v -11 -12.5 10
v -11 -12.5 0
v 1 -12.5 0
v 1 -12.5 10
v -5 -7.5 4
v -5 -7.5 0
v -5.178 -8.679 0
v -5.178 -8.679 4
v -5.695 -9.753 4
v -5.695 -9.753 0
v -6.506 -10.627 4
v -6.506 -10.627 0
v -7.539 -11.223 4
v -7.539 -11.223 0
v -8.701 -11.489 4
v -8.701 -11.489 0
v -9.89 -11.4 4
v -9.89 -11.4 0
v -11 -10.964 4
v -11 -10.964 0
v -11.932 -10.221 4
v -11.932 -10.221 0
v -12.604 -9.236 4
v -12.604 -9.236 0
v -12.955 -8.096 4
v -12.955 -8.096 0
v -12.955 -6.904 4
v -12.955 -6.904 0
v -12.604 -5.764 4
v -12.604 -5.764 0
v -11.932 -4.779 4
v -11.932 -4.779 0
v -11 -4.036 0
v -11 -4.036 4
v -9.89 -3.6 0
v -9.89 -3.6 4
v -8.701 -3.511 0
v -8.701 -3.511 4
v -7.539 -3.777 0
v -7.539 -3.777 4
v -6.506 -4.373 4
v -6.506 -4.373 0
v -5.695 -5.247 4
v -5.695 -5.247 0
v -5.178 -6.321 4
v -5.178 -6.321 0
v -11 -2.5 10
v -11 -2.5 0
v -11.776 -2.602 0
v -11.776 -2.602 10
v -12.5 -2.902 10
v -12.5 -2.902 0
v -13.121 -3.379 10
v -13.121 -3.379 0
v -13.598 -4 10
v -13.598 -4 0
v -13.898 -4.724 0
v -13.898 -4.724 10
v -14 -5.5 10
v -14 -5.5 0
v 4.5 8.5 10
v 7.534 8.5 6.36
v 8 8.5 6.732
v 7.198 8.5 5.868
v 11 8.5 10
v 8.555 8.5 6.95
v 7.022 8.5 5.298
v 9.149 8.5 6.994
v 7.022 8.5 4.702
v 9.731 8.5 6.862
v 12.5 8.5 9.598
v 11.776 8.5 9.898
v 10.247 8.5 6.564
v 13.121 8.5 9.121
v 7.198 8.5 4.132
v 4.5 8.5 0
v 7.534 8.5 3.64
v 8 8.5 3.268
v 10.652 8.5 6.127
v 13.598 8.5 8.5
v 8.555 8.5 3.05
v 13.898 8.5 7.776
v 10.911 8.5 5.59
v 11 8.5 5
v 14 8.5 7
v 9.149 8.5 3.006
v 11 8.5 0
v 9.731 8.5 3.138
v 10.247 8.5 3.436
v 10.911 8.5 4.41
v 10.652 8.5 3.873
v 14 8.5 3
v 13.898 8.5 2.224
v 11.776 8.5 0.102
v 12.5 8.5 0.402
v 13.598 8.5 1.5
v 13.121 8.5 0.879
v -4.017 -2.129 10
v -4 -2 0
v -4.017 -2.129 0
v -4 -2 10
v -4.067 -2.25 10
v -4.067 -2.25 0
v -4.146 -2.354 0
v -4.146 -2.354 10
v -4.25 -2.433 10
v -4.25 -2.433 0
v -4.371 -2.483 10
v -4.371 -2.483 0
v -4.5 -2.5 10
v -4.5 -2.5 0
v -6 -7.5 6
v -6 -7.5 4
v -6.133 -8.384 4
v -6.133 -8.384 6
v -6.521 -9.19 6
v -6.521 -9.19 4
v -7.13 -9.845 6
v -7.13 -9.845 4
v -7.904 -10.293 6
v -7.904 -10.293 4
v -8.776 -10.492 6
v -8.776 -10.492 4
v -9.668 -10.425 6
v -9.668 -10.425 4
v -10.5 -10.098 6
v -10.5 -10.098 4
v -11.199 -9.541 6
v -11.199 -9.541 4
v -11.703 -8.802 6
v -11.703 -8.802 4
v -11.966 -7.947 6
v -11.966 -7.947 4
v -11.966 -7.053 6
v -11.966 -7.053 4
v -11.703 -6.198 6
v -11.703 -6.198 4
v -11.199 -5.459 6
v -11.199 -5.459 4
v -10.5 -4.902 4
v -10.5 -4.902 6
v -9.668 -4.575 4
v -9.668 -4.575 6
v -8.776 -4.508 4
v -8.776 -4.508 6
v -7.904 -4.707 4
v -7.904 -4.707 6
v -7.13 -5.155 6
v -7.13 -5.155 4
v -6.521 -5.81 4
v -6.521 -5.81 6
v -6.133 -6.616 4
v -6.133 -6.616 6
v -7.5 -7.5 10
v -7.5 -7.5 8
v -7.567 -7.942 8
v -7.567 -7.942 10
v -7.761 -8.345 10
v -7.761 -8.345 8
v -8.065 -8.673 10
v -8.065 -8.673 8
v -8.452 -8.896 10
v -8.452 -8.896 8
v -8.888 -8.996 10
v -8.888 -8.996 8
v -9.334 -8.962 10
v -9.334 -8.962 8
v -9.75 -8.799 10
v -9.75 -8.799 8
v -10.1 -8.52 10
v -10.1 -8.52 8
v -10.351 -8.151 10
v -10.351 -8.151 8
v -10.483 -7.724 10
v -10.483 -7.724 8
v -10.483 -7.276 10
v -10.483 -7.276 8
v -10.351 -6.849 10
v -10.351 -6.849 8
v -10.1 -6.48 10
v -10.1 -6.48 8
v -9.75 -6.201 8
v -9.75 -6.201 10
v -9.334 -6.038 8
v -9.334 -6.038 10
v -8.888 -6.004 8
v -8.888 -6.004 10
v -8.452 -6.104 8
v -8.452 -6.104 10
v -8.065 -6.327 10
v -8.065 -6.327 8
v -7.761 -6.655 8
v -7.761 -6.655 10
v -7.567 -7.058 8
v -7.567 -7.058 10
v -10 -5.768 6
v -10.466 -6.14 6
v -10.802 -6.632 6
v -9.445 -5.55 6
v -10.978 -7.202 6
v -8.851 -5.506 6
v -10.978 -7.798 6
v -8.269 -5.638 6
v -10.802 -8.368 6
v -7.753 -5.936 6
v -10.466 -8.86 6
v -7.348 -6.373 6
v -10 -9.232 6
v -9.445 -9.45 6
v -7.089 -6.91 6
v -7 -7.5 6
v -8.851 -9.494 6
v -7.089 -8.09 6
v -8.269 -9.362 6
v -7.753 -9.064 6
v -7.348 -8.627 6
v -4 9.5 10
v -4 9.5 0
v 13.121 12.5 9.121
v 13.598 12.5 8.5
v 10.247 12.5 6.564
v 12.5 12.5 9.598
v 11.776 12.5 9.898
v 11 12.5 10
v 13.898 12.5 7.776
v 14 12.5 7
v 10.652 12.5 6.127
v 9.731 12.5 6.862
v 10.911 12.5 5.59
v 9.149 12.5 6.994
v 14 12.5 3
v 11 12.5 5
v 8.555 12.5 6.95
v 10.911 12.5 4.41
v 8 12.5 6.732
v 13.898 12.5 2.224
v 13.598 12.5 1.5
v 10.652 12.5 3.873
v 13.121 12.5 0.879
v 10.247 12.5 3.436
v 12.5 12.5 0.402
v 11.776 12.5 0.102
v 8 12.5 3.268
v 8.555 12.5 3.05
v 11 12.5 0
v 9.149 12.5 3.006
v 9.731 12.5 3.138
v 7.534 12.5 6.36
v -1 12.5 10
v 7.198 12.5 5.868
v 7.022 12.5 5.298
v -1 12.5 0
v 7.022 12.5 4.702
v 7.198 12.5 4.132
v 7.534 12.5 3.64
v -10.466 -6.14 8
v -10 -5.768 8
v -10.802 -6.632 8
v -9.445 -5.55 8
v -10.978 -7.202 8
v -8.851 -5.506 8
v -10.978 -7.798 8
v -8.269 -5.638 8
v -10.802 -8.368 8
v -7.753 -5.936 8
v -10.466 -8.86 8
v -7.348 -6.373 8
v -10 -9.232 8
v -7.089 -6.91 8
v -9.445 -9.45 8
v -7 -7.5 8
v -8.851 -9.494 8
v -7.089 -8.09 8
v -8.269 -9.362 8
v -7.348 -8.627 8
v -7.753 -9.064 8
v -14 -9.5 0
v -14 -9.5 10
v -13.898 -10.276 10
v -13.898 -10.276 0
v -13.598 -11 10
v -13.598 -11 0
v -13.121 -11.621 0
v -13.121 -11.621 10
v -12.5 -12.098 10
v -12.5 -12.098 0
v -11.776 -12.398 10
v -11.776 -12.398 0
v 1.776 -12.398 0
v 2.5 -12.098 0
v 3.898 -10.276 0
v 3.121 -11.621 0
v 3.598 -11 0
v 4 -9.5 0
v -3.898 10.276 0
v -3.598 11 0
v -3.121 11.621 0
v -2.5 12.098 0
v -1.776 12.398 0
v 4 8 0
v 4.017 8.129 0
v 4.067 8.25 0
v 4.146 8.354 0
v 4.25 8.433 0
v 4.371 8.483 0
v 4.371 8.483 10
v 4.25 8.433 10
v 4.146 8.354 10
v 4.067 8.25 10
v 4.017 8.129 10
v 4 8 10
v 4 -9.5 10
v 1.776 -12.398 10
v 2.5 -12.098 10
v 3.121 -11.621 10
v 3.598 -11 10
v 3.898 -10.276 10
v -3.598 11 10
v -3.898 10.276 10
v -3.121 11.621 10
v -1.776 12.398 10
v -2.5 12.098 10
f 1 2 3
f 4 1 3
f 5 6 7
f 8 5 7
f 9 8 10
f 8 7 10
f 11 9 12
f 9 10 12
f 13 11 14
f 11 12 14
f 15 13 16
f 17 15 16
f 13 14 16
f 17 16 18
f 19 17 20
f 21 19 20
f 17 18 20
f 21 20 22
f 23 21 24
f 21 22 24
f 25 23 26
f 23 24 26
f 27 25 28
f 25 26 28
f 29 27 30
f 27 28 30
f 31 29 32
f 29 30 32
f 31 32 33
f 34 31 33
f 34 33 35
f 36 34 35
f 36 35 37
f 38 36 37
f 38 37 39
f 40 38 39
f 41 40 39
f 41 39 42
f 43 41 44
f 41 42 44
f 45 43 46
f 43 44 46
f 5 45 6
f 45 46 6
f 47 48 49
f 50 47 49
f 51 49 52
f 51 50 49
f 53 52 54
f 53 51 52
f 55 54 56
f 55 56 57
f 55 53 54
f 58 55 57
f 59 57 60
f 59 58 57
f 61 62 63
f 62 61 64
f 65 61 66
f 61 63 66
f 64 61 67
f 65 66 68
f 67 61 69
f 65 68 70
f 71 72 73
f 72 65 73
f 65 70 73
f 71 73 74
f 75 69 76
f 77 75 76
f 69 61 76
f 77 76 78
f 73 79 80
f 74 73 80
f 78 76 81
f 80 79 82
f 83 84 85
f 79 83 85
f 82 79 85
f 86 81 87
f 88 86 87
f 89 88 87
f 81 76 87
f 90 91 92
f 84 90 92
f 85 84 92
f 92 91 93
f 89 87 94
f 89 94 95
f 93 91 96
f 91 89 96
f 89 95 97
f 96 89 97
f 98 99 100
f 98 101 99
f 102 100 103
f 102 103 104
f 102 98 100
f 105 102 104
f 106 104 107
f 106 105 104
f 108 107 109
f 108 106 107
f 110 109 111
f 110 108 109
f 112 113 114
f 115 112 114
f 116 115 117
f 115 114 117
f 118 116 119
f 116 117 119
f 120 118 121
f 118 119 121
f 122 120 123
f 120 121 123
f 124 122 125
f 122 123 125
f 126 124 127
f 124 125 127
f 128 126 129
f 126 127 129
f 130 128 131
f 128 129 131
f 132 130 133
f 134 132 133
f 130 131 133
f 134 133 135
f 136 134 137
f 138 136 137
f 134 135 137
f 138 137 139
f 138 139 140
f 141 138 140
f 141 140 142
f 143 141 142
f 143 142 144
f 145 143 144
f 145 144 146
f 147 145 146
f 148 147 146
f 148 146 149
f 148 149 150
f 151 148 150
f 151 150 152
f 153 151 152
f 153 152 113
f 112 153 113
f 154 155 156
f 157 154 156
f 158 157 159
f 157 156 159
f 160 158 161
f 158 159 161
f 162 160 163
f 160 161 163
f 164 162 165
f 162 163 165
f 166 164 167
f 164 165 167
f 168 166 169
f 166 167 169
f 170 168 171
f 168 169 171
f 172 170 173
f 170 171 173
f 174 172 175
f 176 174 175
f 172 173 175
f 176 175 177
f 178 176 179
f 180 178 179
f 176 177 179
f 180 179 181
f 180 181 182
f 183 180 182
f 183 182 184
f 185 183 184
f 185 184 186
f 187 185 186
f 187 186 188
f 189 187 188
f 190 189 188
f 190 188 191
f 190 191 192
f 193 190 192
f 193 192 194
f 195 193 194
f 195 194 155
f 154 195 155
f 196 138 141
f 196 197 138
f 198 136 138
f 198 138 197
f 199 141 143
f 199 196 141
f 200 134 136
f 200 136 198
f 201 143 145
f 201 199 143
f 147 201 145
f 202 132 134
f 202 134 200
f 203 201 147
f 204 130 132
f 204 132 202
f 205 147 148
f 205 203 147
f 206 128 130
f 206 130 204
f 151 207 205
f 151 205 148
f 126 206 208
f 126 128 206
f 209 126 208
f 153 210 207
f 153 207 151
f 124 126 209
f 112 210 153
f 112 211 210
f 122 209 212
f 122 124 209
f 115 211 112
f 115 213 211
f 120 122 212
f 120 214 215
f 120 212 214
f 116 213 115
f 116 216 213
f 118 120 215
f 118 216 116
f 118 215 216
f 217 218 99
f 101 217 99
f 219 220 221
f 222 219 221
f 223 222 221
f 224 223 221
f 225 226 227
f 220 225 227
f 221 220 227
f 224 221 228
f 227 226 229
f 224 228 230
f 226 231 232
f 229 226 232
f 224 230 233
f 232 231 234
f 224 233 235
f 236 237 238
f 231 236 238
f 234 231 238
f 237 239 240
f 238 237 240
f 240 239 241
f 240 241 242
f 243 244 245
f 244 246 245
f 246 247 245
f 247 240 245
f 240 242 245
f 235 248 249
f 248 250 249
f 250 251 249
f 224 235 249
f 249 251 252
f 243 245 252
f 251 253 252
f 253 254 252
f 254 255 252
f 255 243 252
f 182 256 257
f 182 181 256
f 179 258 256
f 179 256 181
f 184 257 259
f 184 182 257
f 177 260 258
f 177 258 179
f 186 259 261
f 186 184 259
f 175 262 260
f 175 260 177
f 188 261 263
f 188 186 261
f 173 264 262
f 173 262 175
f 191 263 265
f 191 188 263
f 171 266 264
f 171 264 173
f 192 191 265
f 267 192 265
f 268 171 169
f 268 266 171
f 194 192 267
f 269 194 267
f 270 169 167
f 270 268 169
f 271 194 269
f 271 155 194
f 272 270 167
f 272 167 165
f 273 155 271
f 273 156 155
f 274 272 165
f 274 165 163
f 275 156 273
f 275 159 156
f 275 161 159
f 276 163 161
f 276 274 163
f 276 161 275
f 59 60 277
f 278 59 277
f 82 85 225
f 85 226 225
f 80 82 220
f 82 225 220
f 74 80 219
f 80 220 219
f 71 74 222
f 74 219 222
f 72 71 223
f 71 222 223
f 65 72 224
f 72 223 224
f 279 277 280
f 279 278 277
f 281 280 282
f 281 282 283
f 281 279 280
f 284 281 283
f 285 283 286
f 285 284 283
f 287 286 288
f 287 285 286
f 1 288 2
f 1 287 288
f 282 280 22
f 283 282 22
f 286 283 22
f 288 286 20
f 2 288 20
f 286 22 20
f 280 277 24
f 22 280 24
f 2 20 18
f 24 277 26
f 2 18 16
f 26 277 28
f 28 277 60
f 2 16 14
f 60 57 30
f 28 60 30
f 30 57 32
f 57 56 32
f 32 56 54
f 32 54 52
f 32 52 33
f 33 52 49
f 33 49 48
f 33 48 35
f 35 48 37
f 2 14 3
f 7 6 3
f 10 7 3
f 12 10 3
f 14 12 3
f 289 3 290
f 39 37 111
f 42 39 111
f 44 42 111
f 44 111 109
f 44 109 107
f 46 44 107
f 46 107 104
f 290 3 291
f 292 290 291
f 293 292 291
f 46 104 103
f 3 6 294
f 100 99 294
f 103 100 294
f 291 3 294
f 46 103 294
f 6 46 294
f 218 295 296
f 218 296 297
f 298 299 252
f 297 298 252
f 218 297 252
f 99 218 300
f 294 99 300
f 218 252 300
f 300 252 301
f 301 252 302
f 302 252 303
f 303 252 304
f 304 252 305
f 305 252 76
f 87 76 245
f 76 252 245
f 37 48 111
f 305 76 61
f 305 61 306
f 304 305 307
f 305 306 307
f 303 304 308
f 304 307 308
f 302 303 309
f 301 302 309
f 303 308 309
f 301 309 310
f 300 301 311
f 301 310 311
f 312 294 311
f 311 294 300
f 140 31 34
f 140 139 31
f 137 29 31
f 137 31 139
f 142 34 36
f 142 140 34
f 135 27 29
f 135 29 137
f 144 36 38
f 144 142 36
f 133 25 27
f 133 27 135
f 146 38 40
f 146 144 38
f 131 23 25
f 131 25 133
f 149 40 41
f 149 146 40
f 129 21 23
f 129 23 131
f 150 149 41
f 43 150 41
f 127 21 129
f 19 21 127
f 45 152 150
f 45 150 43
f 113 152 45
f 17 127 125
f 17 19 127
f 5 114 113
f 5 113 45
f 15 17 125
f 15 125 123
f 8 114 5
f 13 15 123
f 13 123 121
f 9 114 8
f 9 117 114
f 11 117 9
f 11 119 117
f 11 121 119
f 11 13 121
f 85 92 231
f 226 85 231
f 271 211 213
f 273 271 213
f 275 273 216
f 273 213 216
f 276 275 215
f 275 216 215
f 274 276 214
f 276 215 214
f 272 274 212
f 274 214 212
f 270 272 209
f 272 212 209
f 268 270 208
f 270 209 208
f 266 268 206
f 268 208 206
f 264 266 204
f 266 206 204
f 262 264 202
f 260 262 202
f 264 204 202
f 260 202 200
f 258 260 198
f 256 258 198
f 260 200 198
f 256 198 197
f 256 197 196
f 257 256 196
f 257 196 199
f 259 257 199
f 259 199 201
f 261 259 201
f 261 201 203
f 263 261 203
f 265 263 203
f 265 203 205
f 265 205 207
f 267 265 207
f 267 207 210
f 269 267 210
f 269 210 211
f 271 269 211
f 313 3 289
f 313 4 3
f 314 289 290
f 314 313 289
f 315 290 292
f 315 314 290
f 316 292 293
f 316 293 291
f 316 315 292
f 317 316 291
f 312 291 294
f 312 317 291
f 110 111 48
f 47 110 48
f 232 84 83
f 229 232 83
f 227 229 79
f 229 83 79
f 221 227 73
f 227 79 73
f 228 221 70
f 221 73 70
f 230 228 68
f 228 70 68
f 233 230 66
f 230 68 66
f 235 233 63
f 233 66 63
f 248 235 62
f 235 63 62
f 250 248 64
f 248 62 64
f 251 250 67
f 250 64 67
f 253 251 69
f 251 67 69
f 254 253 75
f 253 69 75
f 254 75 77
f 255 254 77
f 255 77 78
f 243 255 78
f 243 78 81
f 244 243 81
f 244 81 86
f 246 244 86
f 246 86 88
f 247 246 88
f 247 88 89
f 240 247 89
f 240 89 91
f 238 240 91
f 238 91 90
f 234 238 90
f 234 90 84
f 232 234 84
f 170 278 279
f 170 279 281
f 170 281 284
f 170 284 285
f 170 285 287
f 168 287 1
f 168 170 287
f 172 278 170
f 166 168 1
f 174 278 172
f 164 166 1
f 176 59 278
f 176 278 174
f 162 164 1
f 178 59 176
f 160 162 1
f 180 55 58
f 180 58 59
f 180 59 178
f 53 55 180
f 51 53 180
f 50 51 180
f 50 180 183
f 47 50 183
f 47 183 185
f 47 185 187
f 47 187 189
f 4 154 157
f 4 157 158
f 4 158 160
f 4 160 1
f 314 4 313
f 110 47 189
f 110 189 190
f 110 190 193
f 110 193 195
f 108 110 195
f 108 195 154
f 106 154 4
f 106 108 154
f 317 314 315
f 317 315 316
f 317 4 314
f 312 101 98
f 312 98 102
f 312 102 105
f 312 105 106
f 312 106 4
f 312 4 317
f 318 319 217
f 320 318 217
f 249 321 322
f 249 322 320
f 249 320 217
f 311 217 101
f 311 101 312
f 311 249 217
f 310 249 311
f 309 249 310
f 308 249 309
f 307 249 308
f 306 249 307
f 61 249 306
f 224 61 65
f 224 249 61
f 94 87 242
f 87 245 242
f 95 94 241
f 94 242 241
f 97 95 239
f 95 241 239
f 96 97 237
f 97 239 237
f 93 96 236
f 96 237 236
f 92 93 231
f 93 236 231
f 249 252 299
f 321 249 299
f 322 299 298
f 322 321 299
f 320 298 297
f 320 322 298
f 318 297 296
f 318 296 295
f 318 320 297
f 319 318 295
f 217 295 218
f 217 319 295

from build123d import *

# Parameters (mm, degrees)
F1_DEPTH  = 10
F2_R      = 3
F3_R      = 1.5
F4_DEPTH  = 10.001
F5_R      = 2
F6_DEPTH  = 8
F7_R      = 3
F8_DEPTH  = 6
F9_R      = 4
F10_DEPTH = 4
F11_R     = 3
F12_R     = 2
F13_DEPTH = 4.001
F14_R     = 3
F15_R     = 0.5


with BuildPart() as f1:
    # F0 (on Top) → F1 (new body)
    with BuildSketch(Plane.XY):
        Polygon((14, 12.5), (4, 12.5), (-4, 12.5), (-4, -2.5), (-14, -2.5), (-14, -12.5), (-4, -12.5), (4, -12.5), (4, 8.5), (14, 8.5), align=None)
    extrude(amount=F1_DEPTH)

    # F2
    f2_edges = [f1.edges().sort_by_distance(p)[0] for p in [
        (-4, 12.5, 5),
        (4, -12.5, 5),
    ]]
    fillet(f2_edges, radius=F2_R)

    # F3 (on face) → F4 (cut, through all)
    with BuildSketch(Plane(origin=(0, 0, 0), x_dir=(1, 0, 0), z_dir=(0, 0, -1))):
        with Locations((-9, 7.5)):
            Circle(F3_R)
    extrude(amount=-F4_DEPTH, mode=Mode.SUBTRACT)

    # F5 (on face) → F6 (cut)
    with BuildSketch(Plane(origin=(0, 0, 0), x_dir=(1, 0, 0), z_dir=(0, 0, -1))):
        with Locations((-9, 7.5)):
            Circle(F5_R)
    extrude(amount=-F6_DEPTH, mode=Mode.SUBTRACT)

    # F7 (on face) → F8 (cut)
    with BuildSketch(Plane(origin=(0, 0, 0), x_dir=(1, 0, 0), z_dir=(0, 0, -1))):
        with Locations((-9, 7.5)):
            Circle(F7_R)
    extrude(amount=-F8_DEPTH, mode=Mode.SUBTRACT)

    # F9 (on face) → F10 (cut)
    with BuildSketch(Plane(origin=(0, 0, 0), x_dir=(1, 0, 0), z_dir=(0, 0, -1))):
        with Locations((-9, 7.5)):
            Circle(F9_R)
    extrude(amount=-F10_DEPTH, mode=Mode.SUBTRACT)

    # F11
    f11_edges = [f1.edges().sort_by_distance(p)[0] for p in [
        (-14, -2.5, 5),
        (-14, -12.5, 5),
    ]]
    fillet(f11_edges, radius=F11_R)

    # F12 (on face) → F13 (cut, through all)
    with BuildSketch(Plane.XZ.offset(-8.5)):
        with Locations((9, 5)):
            Circle(F12_R)
    extrude(amount=-F13_DEPTH, mode=Mode.SUBTRACT)

    # F14
    f14_edges = [f1.edges().sort_by_distance(p)[0] for p in [
        (14, 10.5, 0),
        (14, 10.5, 10),
    ]]
    fillet(f14_edges, radius=F14_R)

    # F15
    f15_edges = [f1.edges().sort_by_distance(p)[0] for p in [
        (4, 8.5, 5),
        (-4, -2.5, 5),
    ]]
    fillet(f15_edges, radius=F15_R)


solid = f1.part
